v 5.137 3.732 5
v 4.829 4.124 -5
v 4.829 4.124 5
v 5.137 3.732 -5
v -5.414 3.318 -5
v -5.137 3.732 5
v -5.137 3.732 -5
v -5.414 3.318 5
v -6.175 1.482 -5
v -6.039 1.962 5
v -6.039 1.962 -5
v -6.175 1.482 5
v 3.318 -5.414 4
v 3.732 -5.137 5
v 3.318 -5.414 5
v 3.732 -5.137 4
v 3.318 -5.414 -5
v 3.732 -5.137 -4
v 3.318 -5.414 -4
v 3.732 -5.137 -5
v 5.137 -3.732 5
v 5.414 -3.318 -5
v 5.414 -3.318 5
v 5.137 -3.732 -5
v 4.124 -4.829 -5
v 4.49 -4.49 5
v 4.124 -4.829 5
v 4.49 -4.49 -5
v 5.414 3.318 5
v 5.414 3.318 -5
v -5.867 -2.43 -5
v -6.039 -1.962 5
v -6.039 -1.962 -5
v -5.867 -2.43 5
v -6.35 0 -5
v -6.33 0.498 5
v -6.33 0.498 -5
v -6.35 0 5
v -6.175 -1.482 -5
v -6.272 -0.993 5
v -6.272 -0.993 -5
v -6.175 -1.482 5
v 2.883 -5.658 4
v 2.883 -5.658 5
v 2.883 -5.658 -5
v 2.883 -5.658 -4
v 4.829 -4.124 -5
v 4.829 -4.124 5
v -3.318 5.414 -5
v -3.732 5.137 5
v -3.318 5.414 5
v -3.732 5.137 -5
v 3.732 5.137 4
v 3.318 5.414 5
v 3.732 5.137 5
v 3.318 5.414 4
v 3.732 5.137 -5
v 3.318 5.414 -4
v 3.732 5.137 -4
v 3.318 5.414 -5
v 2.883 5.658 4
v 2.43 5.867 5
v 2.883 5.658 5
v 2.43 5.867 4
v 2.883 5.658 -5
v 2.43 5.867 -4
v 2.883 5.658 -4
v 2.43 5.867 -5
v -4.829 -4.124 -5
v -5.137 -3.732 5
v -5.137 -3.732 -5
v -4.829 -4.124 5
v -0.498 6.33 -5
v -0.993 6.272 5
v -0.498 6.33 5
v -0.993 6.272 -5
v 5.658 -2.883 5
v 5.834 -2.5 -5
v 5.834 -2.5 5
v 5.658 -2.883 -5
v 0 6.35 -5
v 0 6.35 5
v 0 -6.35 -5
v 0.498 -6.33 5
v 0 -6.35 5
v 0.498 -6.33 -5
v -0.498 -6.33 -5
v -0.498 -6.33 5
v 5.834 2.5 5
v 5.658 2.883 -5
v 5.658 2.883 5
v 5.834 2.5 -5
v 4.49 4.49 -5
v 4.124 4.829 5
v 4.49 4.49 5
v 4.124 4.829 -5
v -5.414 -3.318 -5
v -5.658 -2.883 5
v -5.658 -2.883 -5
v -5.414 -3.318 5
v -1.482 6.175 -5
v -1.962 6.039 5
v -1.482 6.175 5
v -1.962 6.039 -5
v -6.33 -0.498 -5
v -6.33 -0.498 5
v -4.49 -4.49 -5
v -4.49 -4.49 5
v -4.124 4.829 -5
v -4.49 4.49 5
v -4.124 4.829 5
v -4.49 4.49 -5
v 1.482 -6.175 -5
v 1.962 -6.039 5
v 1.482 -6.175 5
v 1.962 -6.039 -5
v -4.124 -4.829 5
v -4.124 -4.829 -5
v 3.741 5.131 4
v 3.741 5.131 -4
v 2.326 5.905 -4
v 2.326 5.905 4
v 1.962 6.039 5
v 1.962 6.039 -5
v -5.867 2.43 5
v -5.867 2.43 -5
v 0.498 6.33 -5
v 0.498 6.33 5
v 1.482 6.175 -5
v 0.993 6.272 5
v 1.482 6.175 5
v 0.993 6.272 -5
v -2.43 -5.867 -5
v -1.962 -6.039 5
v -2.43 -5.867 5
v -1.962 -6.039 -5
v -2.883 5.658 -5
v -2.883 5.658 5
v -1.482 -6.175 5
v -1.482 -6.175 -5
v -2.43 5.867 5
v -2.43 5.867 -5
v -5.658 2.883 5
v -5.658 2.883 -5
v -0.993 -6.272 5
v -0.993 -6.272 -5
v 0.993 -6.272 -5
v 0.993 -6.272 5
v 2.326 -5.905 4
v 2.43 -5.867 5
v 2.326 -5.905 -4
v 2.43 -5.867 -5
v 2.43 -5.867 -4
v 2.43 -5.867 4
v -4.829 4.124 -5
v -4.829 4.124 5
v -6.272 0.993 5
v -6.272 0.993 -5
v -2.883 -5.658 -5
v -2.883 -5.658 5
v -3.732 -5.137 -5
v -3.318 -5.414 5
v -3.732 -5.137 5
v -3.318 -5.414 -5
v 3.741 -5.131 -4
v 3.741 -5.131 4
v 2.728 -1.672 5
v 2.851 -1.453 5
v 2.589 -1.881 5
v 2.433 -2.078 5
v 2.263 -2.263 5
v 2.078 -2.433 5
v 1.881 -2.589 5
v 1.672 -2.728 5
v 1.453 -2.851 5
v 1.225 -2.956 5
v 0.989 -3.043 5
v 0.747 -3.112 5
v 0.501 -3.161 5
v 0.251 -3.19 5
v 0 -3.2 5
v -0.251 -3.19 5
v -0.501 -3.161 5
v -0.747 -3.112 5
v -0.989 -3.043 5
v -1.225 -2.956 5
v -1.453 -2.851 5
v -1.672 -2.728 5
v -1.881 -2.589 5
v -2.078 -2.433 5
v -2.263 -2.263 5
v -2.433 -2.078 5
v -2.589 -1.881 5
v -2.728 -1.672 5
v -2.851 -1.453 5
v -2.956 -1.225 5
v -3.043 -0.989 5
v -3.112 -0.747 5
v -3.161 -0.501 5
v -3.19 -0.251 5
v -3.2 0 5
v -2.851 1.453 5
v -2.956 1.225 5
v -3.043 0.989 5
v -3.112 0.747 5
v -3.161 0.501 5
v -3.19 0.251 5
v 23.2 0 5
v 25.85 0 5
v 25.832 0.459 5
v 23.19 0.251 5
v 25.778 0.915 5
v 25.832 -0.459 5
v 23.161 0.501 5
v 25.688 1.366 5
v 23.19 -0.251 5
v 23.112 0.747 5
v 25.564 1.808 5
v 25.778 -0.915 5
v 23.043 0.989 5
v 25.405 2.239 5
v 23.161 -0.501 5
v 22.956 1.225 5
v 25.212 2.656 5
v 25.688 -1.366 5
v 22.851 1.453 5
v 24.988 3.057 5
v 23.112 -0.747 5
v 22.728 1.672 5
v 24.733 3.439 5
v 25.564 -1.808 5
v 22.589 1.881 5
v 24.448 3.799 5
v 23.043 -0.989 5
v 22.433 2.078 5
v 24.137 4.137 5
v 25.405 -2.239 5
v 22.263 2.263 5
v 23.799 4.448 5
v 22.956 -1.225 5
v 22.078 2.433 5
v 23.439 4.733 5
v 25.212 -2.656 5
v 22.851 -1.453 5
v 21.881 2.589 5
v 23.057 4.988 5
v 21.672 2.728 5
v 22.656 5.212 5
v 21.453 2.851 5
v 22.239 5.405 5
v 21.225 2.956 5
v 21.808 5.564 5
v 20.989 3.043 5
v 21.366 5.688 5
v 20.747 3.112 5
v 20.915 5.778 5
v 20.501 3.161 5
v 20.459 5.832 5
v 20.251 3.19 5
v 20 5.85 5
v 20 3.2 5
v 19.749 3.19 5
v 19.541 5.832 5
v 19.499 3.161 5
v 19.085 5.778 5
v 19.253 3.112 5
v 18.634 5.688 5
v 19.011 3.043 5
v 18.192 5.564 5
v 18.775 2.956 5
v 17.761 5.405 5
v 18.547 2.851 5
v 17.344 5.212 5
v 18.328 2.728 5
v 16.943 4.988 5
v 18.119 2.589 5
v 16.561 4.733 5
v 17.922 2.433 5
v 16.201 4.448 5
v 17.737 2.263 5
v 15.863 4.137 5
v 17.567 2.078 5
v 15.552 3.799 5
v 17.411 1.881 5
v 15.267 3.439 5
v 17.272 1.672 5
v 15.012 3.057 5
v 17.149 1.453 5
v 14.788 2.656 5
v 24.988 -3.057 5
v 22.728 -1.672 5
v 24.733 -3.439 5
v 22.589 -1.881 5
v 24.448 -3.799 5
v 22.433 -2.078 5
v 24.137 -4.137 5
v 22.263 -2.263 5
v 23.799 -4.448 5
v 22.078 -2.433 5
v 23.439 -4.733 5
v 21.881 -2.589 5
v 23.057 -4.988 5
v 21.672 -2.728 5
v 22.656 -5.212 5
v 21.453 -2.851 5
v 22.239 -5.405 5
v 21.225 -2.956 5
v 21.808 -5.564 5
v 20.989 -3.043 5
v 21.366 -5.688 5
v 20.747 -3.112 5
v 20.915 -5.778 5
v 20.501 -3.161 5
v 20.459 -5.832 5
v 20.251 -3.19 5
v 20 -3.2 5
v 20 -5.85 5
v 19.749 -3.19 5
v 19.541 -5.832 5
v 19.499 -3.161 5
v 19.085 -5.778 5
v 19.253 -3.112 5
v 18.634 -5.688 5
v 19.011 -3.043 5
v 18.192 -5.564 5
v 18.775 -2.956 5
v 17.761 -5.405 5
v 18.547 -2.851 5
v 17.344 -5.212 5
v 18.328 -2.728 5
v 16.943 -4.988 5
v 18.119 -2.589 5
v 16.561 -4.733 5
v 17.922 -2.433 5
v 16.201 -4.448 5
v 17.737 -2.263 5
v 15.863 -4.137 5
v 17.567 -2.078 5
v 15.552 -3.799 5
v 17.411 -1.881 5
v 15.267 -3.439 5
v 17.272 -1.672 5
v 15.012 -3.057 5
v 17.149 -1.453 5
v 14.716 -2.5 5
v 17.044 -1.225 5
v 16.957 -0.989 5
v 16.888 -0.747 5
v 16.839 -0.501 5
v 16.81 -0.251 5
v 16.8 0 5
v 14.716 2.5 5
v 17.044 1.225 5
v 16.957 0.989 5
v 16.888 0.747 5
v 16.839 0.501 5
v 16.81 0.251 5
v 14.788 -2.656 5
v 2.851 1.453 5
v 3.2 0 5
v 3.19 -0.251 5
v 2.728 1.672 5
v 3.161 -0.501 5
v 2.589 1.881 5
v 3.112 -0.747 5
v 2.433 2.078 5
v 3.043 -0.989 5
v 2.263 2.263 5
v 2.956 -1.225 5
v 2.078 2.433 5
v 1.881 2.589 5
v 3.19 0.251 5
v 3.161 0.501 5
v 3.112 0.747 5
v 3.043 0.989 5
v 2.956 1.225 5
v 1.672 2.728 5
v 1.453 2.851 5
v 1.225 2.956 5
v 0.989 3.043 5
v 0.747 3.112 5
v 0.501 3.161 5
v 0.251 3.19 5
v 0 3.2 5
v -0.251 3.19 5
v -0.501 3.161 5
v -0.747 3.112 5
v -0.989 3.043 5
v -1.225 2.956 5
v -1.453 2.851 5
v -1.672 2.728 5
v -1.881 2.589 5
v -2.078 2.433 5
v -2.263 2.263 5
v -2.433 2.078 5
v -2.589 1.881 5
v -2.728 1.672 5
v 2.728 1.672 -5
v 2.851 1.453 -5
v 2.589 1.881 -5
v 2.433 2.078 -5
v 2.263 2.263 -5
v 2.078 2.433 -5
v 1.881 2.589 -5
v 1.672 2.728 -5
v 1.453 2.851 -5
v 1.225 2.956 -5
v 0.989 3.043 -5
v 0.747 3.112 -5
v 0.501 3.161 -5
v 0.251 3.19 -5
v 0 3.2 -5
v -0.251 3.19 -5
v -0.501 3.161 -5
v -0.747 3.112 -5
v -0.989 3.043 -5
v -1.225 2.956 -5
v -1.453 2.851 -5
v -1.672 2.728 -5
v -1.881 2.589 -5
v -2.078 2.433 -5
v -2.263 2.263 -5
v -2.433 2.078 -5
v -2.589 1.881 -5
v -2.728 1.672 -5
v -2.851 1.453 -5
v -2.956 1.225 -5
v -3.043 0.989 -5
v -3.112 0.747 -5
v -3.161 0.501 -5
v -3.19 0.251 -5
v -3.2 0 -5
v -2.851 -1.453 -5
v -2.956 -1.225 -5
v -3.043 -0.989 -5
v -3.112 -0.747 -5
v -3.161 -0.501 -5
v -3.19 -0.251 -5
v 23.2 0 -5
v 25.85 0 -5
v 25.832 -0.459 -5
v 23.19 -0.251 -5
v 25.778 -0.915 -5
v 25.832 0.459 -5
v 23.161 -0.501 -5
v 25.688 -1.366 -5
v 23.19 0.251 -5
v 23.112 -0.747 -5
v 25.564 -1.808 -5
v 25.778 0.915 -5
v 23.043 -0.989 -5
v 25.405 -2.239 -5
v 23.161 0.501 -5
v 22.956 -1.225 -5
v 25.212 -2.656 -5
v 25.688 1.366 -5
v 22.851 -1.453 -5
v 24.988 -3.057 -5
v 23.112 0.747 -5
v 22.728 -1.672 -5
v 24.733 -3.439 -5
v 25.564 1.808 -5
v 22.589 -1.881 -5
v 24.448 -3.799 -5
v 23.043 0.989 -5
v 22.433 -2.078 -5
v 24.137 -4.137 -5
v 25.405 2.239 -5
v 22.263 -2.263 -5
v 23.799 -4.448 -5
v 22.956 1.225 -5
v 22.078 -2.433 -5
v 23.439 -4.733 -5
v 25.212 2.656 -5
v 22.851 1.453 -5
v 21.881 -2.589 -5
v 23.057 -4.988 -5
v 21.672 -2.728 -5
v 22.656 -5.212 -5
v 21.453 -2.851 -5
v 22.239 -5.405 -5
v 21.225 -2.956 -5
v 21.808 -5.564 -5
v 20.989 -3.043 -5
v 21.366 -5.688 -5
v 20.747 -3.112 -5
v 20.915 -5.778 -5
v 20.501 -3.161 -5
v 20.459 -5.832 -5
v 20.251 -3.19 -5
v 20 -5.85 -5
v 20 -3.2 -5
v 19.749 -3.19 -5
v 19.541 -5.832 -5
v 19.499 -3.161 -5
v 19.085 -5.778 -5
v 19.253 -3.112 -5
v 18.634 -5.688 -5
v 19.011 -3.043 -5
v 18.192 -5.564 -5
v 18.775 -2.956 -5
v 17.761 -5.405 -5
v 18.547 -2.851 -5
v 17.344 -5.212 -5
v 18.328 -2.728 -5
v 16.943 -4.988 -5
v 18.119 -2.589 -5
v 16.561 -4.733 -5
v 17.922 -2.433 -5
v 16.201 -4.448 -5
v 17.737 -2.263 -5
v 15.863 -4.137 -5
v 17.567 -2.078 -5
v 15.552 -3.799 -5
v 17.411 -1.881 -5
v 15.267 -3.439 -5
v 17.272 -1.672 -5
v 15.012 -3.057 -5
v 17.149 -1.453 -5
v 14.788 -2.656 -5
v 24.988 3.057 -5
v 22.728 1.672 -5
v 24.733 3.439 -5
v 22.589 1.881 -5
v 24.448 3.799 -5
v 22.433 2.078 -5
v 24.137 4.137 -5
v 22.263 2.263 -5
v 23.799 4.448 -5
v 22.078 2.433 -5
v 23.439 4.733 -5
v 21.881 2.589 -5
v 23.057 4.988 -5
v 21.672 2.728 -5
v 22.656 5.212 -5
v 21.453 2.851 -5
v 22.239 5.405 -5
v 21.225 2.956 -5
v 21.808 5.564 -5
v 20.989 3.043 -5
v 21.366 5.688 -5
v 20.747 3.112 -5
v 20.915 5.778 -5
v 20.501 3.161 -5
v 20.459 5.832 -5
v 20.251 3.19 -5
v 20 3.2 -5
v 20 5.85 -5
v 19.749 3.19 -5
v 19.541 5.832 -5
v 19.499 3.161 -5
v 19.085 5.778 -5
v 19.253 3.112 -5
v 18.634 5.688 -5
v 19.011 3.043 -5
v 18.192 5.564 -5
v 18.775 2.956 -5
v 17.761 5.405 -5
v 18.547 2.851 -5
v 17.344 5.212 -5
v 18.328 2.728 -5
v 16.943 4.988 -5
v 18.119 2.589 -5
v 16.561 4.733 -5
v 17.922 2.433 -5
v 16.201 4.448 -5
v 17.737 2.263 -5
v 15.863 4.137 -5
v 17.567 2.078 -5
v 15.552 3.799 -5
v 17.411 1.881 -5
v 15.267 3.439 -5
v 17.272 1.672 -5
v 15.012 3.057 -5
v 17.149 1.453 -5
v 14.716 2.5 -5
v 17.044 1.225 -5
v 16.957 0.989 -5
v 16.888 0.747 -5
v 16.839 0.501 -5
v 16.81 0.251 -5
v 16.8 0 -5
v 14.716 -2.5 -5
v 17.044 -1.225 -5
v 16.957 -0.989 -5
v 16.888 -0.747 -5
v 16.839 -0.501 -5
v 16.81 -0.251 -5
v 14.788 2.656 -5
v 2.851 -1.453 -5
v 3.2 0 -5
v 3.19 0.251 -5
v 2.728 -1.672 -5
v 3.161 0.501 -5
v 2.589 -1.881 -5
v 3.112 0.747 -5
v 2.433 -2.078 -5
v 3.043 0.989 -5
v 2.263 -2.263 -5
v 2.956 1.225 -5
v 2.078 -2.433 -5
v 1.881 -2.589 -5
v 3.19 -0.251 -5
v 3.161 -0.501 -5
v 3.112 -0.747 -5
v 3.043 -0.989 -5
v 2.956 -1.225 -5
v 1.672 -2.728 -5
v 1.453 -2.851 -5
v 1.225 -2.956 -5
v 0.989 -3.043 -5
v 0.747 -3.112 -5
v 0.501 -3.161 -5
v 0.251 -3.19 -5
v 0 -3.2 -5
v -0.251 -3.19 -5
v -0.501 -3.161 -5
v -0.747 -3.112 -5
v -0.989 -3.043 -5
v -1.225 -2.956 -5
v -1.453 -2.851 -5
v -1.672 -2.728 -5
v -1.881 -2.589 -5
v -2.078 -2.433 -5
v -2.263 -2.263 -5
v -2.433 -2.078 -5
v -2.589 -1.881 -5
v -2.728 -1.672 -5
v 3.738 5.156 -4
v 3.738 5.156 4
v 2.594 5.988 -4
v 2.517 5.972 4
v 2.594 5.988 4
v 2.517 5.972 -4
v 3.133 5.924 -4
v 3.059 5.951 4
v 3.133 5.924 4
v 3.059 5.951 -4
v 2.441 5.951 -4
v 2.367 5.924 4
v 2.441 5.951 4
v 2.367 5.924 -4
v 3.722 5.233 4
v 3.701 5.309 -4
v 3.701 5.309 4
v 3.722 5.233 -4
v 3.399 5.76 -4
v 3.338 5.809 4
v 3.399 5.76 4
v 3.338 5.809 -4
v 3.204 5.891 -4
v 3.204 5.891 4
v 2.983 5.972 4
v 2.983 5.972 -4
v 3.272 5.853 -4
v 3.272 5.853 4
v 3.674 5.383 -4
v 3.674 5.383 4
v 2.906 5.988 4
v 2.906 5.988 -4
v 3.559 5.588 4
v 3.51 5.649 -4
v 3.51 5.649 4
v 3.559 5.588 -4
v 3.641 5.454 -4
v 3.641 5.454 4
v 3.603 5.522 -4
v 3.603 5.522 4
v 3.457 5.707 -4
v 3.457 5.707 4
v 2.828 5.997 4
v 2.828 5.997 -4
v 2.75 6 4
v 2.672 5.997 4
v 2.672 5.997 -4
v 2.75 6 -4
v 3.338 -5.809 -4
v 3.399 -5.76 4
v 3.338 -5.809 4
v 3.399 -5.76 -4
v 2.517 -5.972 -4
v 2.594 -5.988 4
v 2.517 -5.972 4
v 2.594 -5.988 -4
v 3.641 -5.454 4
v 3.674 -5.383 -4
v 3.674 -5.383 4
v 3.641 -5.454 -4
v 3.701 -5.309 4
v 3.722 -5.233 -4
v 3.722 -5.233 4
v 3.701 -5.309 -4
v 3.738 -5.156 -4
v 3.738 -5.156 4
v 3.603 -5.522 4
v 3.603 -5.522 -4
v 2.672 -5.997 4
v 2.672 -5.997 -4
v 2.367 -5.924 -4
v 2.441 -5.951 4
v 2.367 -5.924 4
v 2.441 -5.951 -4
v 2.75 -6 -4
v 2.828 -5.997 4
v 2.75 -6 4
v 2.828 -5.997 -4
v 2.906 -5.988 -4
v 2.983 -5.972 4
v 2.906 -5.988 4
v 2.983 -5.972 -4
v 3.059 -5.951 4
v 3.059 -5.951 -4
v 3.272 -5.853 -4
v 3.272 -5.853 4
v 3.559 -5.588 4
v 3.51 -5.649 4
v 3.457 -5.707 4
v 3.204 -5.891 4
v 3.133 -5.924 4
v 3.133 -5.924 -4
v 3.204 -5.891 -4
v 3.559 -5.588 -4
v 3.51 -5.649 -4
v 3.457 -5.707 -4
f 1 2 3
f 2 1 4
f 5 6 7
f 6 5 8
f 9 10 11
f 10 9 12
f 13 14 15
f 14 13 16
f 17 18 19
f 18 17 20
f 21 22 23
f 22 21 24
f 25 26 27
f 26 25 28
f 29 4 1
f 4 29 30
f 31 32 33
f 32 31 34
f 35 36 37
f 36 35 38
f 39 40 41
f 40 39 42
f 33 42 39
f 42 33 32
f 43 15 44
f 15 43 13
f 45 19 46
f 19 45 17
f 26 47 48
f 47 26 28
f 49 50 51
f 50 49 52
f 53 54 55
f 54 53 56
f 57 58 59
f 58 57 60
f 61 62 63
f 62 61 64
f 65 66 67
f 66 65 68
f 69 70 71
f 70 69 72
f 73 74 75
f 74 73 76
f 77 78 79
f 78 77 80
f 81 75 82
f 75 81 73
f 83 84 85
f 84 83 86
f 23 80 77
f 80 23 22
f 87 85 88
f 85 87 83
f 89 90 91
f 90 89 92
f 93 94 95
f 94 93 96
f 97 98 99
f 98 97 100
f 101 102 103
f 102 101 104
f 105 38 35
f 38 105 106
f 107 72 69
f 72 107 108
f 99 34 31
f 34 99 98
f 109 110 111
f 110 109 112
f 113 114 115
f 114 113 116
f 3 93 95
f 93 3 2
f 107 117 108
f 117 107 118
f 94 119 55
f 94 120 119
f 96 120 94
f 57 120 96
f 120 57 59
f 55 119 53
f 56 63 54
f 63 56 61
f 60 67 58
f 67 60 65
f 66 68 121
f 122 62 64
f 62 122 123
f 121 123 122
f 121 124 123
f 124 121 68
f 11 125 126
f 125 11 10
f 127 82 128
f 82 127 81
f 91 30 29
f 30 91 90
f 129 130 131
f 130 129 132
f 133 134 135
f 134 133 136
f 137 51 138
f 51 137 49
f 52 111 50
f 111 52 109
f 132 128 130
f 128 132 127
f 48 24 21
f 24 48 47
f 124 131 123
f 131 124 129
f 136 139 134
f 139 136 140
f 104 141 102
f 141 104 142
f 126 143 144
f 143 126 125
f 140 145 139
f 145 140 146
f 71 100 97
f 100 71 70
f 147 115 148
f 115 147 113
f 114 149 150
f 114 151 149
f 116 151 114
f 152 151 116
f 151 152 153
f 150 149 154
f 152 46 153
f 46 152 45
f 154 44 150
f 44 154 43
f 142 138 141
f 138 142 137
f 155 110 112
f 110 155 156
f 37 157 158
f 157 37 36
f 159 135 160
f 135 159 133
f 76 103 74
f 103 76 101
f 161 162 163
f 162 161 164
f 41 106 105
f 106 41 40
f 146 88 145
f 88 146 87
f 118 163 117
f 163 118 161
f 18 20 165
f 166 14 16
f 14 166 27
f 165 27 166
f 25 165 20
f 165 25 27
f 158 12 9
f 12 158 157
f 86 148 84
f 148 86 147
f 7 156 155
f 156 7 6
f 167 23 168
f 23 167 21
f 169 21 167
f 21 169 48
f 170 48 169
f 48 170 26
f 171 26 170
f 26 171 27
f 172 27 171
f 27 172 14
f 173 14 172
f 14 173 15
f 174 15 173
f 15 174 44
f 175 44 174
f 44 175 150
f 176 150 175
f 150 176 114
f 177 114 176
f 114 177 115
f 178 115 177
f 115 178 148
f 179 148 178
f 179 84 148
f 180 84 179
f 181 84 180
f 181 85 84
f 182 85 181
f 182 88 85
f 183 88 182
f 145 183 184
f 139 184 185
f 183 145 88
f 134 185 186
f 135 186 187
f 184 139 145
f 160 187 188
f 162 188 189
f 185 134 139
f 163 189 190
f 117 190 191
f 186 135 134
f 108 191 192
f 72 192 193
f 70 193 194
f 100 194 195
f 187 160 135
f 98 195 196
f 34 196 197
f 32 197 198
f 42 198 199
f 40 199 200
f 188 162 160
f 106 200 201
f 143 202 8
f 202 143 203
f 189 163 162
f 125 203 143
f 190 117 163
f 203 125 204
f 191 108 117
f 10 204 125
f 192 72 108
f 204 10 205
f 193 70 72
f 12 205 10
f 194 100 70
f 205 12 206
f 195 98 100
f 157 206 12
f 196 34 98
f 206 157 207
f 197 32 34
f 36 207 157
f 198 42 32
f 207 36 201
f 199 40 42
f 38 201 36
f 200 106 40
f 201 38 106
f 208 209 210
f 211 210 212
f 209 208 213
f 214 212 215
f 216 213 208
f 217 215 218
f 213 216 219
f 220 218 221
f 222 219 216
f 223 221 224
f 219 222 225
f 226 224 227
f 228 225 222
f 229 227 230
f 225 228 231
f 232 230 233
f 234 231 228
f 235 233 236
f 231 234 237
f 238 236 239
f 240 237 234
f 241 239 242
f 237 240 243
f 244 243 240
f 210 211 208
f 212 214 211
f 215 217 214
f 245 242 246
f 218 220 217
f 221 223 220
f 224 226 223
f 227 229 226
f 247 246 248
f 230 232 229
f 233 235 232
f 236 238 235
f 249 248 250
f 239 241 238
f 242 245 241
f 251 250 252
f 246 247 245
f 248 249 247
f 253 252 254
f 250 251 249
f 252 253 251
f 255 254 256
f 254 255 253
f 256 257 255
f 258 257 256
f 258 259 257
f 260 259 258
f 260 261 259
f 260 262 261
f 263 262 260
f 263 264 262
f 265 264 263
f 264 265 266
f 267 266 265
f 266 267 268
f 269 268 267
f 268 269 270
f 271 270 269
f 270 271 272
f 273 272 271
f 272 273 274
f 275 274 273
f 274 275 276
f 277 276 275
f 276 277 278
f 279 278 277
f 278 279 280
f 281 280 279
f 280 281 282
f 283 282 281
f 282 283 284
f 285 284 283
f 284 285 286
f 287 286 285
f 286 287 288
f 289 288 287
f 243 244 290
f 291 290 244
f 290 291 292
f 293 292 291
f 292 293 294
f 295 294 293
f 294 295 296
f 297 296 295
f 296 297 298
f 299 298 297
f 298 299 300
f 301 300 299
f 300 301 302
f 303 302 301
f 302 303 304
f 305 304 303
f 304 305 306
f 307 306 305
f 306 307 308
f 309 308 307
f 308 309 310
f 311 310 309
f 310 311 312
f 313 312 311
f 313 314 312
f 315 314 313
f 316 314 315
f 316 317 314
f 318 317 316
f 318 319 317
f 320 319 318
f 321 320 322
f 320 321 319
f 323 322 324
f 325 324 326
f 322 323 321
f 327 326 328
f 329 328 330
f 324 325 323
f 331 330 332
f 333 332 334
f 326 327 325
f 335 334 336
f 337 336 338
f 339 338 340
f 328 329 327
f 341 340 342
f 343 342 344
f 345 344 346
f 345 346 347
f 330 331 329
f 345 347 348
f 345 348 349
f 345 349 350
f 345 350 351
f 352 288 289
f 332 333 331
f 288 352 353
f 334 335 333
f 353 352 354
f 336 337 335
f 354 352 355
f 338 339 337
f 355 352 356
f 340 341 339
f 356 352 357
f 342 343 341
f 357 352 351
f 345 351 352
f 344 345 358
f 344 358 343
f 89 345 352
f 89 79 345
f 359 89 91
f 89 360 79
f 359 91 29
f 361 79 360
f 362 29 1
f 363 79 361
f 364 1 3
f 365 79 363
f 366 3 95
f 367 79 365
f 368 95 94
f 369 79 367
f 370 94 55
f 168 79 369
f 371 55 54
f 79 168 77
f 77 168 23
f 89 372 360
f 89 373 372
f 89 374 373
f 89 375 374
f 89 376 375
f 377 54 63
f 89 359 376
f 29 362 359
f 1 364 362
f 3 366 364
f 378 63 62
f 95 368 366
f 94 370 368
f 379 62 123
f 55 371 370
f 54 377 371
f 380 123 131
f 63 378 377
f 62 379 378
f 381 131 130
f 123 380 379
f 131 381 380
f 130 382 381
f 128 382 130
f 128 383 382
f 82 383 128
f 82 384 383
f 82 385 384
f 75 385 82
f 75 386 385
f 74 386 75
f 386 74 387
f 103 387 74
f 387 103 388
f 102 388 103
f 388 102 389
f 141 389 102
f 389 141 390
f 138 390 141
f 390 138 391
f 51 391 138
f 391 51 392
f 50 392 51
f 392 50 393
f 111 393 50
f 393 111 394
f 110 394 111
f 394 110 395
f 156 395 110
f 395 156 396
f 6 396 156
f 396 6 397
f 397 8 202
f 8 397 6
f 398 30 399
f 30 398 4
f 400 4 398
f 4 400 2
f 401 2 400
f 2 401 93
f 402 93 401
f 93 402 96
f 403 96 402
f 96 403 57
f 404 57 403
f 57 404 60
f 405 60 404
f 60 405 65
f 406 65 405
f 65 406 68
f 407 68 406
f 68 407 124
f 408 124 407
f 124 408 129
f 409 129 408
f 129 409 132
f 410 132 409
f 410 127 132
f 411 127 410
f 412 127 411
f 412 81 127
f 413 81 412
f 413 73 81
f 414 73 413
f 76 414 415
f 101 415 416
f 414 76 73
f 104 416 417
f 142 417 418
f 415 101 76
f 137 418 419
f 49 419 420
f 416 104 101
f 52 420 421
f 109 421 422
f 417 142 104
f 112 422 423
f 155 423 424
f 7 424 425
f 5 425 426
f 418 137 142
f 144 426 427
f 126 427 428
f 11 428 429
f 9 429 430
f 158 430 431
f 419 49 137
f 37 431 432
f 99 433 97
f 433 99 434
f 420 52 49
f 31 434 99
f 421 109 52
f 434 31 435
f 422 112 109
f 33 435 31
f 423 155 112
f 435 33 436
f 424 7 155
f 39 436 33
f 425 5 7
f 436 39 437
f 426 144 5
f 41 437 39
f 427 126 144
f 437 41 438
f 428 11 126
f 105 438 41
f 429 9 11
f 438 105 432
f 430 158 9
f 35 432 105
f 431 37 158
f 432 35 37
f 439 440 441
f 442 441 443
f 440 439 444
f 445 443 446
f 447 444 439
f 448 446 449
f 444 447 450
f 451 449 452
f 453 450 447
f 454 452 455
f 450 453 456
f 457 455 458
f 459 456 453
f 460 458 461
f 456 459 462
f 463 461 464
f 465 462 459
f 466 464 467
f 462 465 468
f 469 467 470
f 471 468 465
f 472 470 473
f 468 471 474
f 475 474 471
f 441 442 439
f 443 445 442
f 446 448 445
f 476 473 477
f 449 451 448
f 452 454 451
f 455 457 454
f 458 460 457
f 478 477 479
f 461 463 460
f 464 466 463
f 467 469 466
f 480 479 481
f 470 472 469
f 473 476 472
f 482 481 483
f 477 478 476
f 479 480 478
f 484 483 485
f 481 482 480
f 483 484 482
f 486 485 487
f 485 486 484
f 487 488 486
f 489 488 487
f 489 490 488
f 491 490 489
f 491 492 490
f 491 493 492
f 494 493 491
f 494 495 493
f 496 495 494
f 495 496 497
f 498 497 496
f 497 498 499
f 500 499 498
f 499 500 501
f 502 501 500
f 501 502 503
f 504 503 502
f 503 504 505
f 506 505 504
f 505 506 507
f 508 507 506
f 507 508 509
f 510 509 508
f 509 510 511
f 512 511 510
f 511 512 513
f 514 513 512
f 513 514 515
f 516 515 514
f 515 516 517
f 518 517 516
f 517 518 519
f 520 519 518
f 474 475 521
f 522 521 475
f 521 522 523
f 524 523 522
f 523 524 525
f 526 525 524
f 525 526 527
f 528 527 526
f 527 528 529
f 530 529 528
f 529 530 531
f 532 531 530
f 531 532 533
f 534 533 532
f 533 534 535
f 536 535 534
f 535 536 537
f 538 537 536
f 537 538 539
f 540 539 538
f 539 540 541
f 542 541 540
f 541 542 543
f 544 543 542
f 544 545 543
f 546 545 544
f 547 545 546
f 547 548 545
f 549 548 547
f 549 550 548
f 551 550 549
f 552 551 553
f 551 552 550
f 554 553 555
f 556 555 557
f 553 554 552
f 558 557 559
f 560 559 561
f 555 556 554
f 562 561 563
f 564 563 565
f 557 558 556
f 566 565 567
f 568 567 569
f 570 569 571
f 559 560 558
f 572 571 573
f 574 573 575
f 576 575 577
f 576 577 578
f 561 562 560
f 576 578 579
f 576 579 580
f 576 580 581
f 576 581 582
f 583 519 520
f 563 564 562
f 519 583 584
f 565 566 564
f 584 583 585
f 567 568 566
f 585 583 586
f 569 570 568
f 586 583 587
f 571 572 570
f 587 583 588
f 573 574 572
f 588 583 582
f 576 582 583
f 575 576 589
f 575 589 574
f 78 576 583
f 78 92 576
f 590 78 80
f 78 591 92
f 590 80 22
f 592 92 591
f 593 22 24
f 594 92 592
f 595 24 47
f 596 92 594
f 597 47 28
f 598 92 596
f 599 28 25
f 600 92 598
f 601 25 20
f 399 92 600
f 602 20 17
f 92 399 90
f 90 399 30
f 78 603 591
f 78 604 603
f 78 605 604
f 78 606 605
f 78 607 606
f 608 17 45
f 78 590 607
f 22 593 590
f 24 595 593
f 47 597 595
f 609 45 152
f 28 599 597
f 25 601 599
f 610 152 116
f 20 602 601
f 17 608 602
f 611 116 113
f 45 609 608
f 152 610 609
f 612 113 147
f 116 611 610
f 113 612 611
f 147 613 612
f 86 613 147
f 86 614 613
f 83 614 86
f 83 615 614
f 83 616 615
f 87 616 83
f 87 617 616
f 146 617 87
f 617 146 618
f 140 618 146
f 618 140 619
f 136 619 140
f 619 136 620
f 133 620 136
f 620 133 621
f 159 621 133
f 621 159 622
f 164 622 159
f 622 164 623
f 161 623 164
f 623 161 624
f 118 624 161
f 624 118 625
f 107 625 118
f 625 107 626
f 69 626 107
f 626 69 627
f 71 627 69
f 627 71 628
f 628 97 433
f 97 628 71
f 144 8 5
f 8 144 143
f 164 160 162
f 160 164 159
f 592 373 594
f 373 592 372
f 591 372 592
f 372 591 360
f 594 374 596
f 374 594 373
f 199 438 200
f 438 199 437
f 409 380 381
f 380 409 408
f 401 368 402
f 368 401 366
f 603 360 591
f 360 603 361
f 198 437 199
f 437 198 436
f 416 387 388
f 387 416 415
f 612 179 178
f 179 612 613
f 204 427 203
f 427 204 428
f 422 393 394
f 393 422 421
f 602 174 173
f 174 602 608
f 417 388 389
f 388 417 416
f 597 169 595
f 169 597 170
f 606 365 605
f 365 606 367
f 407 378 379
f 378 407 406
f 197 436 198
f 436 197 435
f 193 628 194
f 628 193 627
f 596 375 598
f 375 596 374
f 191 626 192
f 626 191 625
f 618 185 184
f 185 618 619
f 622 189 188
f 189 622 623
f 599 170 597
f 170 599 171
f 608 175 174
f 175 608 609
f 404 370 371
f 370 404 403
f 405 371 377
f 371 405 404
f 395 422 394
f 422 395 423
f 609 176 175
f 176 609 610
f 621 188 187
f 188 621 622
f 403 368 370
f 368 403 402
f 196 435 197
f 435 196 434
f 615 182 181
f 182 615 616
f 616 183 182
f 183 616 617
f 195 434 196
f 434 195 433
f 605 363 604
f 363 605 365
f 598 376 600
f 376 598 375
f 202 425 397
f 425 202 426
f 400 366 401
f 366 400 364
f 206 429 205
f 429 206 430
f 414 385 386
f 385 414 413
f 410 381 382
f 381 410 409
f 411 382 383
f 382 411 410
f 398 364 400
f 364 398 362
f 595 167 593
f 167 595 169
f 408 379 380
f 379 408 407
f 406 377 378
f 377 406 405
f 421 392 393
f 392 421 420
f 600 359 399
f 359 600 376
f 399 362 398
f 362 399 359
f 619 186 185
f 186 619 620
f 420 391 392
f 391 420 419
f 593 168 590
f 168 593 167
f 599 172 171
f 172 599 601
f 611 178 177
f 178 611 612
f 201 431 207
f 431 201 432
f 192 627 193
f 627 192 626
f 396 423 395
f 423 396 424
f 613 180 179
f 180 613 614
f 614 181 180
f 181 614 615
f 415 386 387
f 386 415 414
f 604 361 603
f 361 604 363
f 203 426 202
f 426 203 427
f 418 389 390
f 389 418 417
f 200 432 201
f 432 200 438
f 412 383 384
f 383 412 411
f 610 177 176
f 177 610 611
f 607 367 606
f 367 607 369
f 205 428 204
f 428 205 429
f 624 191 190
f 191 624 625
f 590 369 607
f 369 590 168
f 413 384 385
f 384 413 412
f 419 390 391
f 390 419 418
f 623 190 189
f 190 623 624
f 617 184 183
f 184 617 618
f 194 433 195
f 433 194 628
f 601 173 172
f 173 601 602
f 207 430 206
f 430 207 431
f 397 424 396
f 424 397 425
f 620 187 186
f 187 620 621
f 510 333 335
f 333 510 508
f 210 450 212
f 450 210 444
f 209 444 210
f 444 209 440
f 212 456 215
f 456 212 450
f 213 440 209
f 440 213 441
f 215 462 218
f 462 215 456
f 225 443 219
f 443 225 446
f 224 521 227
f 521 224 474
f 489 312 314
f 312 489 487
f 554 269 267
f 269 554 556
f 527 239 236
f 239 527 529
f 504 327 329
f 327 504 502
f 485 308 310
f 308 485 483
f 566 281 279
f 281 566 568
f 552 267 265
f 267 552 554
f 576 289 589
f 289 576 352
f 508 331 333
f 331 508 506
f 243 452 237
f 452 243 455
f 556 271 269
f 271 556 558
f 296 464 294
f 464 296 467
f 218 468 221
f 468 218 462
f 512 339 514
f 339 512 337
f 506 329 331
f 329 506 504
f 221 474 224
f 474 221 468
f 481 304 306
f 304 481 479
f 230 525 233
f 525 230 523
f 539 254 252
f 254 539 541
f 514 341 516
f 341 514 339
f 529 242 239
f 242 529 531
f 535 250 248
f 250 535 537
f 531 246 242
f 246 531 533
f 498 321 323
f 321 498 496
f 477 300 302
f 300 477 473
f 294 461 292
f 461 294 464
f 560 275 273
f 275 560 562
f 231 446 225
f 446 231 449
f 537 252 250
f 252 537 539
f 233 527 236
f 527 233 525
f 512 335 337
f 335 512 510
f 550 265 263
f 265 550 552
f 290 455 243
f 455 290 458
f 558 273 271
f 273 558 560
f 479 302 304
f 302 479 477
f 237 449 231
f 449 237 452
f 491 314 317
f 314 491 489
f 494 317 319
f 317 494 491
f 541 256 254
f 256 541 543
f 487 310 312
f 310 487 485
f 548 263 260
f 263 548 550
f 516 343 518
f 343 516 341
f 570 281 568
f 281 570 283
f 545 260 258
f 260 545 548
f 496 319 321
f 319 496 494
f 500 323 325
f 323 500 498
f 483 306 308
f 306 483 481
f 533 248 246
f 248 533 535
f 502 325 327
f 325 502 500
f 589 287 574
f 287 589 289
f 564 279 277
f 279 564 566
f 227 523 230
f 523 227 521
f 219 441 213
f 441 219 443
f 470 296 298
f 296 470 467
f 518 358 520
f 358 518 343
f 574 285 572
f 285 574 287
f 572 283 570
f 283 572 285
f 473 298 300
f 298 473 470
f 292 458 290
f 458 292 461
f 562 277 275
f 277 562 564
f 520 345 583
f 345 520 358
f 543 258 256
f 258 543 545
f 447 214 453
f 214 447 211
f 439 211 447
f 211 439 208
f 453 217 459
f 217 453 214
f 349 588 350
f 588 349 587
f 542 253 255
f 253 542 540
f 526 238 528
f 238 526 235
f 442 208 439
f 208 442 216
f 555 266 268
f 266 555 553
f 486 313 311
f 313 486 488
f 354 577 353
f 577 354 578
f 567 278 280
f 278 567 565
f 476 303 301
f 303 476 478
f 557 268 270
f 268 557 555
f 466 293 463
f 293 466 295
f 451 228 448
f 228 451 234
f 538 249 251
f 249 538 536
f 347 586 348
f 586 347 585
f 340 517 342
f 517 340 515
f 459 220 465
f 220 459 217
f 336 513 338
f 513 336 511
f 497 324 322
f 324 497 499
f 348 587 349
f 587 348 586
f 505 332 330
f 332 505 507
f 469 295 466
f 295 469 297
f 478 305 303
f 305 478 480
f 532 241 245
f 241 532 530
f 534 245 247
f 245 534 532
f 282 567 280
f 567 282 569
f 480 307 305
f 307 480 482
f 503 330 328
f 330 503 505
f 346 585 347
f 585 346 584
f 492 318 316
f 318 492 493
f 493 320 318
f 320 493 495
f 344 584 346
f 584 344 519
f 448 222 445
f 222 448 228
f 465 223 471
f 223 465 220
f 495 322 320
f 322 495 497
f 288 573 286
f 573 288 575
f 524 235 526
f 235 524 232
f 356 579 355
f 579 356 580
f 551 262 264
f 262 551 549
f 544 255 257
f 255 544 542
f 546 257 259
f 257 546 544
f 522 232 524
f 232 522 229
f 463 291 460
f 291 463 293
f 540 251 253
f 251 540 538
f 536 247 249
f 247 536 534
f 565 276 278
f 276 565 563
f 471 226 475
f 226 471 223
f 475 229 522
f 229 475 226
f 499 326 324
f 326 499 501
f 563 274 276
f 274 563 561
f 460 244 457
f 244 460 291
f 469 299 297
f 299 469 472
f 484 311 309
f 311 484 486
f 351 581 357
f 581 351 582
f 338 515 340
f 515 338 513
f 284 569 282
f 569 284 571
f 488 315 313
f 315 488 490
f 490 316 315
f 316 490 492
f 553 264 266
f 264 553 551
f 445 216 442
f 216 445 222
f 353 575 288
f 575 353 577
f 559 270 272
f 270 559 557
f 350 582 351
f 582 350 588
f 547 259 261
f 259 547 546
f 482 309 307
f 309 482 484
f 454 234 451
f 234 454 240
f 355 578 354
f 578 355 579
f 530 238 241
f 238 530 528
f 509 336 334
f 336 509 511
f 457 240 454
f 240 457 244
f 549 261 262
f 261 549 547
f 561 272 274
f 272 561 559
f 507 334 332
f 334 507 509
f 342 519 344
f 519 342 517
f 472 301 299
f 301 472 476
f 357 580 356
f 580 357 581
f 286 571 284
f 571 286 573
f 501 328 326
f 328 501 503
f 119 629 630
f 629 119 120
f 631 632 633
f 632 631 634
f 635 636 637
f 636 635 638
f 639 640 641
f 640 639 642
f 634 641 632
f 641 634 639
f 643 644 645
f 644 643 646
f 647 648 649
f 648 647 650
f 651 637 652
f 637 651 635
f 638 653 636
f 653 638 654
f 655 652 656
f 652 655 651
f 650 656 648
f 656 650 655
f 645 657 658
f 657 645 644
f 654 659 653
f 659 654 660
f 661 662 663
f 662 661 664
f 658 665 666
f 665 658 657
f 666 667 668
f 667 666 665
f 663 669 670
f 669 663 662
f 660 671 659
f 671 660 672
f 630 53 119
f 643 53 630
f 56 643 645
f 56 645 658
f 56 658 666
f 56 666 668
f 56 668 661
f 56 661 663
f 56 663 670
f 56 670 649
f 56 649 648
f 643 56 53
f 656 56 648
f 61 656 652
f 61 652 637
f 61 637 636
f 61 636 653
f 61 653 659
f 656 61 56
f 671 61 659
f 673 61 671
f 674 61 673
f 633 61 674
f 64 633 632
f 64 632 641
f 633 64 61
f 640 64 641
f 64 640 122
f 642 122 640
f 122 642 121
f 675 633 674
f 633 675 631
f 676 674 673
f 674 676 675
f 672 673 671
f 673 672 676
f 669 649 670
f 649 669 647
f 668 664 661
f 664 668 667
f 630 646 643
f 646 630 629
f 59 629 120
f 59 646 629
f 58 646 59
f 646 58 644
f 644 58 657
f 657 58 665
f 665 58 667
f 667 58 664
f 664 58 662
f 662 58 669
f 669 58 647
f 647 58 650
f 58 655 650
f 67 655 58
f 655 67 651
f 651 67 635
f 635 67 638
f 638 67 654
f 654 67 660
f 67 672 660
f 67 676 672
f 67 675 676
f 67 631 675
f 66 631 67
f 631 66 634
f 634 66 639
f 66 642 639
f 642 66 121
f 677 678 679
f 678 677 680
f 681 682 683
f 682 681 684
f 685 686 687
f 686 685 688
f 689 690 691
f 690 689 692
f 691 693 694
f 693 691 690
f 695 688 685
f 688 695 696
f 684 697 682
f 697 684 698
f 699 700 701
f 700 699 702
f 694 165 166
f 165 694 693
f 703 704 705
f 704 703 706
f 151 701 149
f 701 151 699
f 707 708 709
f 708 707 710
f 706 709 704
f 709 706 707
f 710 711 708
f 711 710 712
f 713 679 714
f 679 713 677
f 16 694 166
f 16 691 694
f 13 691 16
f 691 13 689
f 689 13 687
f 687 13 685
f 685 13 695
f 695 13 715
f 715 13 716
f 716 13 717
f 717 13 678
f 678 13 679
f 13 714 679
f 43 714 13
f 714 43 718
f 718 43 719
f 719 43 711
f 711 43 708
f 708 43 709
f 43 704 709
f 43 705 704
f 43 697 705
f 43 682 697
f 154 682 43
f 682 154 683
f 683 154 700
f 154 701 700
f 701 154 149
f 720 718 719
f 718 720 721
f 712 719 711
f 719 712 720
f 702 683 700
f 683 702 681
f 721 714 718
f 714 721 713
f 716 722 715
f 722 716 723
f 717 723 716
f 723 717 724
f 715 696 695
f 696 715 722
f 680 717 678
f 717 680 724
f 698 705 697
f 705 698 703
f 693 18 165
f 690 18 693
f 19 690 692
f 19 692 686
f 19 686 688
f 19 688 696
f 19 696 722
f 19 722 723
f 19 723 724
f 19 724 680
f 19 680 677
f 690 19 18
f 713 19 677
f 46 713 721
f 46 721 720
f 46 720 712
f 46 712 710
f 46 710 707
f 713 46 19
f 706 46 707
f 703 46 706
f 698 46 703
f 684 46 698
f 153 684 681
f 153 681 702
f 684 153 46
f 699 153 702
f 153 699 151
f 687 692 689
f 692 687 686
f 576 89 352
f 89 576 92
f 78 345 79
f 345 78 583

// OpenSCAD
$fn=80;

difference()
{
        cylinder (h = 10, r=6.35, center = true);
        color("blue")
        cylinder (h = 11, r=3.2, center = true);;
}

translate([2.75,5,0]) cylinder(8,1,center=true);
translate([2.75,-5,0]) cylinder(8,1,center=true);

difference()
{
        translate([20,0,0]) cylinder (h = 10, r=5.85, center = true);
        color("blue")
        translate([20,0,0]) cylinder (h = 11, r=3.2, center = true);
}

translate([5,-2.5,-5]) cube([10,5,10]);
